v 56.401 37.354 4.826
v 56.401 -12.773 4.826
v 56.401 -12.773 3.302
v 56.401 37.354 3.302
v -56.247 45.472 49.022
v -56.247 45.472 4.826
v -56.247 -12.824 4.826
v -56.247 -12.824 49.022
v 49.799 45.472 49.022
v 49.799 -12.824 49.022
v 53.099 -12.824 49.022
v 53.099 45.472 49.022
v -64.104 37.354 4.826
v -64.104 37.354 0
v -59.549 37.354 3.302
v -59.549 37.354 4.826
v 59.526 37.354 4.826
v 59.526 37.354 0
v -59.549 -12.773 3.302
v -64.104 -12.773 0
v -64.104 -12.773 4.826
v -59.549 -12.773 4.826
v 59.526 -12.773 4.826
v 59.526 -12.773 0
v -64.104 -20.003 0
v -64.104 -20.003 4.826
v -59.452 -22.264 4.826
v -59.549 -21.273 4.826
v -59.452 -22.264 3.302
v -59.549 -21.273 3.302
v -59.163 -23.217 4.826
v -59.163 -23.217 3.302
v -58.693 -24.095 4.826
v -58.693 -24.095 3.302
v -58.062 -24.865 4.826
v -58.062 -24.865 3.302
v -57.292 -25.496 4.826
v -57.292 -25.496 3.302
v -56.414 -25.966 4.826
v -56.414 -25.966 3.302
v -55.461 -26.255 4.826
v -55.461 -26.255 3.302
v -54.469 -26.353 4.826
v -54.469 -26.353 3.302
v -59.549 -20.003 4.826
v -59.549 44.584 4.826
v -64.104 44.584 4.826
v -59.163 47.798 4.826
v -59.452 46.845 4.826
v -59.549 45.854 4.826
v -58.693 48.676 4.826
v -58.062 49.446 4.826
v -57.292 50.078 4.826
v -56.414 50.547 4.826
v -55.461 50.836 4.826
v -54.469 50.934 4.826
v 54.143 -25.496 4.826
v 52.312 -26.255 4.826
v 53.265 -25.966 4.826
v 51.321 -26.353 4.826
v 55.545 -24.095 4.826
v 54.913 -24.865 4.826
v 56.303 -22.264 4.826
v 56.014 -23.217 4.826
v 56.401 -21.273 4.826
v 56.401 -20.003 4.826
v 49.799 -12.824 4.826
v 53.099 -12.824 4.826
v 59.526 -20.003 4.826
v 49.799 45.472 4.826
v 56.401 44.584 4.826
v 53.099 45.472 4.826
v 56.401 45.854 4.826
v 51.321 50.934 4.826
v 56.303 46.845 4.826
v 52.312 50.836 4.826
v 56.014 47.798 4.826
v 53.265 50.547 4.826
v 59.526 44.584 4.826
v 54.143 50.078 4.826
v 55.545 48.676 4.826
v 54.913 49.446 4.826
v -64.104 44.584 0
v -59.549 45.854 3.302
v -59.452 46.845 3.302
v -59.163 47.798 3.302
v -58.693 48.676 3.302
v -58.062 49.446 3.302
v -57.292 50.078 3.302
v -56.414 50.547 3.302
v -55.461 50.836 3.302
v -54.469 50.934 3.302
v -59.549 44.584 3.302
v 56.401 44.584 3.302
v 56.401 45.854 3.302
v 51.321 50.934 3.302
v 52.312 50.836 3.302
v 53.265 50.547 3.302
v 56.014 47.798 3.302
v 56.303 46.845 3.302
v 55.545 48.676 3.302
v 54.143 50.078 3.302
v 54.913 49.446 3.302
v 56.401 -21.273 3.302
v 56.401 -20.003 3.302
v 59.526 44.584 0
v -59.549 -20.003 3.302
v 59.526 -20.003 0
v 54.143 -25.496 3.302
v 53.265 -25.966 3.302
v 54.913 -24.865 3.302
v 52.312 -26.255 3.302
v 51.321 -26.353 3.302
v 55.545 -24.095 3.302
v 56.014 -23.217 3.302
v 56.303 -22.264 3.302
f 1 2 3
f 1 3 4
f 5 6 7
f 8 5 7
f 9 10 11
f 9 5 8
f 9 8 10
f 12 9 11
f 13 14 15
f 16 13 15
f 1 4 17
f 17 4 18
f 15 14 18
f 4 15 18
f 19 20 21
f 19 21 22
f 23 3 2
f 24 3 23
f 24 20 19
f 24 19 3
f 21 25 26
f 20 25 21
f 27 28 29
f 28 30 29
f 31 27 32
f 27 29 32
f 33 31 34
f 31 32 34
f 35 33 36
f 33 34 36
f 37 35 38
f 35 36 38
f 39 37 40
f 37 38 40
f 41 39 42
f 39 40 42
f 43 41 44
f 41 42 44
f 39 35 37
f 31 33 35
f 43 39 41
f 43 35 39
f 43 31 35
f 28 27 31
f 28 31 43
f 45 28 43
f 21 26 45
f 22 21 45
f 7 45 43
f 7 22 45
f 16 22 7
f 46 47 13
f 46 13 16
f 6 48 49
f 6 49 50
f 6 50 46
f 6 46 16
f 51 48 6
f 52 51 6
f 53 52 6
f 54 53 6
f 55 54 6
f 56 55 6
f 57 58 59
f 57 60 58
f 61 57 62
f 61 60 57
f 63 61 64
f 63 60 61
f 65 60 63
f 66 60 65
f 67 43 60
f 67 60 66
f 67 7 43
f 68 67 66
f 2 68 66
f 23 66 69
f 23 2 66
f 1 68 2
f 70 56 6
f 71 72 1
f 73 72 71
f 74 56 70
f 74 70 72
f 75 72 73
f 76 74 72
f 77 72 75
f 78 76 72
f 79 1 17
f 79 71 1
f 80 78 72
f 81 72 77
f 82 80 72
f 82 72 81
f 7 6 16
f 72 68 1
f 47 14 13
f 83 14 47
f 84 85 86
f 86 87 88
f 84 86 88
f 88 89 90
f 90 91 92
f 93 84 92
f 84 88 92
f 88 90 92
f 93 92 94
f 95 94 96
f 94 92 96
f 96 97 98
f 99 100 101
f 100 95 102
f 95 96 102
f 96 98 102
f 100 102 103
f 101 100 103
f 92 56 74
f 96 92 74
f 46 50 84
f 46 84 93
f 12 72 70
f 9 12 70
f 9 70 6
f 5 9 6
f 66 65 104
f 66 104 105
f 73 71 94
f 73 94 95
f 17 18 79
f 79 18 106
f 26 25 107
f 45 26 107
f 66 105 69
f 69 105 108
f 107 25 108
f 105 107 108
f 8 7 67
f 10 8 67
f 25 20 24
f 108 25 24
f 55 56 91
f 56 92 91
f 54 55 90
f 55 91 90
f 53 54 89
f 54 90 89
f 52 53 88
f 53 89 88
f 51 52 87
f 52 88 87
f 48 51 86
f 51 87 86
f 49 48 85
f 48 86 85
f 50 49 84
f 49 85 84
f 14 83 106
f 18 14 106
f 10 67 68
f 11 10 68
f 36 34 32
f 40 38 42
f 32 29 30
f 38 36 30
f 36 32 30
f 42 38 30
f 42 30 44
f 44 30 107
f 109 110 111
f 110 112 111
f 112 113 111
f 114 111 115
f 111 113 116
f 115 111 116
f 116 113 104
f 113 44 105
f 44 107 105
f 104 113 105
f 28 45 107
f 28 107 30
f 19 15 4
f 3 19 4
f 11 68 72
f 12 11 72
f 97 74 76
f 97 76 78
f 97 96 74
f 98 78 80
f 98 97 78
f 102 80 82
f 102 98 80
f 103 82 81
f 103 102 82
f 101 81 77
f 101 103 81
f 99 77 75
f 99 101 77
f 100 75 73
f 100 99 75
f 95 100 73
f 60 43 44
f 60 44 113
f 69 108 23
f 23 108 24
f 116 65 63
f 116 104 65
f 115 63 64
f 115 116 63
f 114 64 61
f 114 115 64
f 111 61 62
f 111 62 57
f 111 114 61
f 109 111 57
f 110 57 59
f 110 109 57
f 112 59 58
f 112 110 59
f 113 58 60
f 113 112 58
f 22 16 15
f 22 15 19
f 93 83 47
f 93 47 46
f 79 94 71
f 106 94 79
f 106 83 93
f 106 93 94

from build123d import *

# Parameters (mm, degrees)
F0_W     = 123.629912734
F0_H     = 7.2298198938
F1_DEPTH = 4.826
F2_W     = 115.9501895308
F2_H     = 7.2298198938
F2_H_2   = 6.35
F2_H_3   = 63.7065680534
F3_DEPTH = 1.524
F5_R     = 5.08
F6_W     = 102.7462986398
F6_H     = 3.4007430077
F6_H_2   = 3.4007552
F7_DEPTH = 44.196
F8_DEPTH = 44.196


# Not quite as in the source:
# - ends of sketch curves that miss each other by under 0.0002 mm in the source are joined


with BuildPart() as f1:
    # F0 (on Top) → F1 (new body)
    with BuildSketch(Plane.XY):
        with Locations((-2.2894367576, -16.3875911385)):
            Rectangle(F0_W, F0_H)
    extrude(amount=F1_DEPTH)


with BuildPart() as f1b:
    # F0 (on Top) → F1, piece 2 (new body)
    with BuildSketch(Plane.XY):
        with Locations((-2.2894367576, 40.9689769149)):
            Rectangle(F0_W, F0_H)
    extrude(amount=F1_DEPTH)


with BuildPart() as f3:
    # F2 (on face) → F3 (new body)
    with BuildSketch(Plane.XY.offset(4.826)):
        with Locations((-1.5743747354, 40.9689769149)):
            Rectangle(F2_W, F2_H)
        with Locations((-1.5743747354, 47.7588868618)):
            Rectangle(F2_W, F2_H_2)
        with Locations((-1.5743747354, 5.5007829413)):
            Rectangle(F2_W, F2_H_3)
    extrude(amount=-F3_DEPTH)


with BuildPart() as f1b_1:
    add(f1b.part)

    # F4: union F3, F1
    add(f3.part)
    add(f1.part)

    # F5
    f5_edges = [f1b_1.edges().sort_by_distance(p)[0] for p in [
        (-59.54947, -26.352501, 4.064),
        (56.40072, -26.352501, 4.064),
        (56.40072, 50.933887, 4.064),
        (-59.54947, 50.933887, 4.064),
    ]]
    fillet(f5_edges, radius=F5_R)

    # F6 (on face) → F7 (join)
    with BuildSketch(Plane.XY.offset(4.826)):
        Polygon((-52.9475212097, 45.4720444977), (-56.2473237514, 45.4720444977), (-56.2473237514, -12.8244720399), (-52.9475212097, -12.8244720399), (-52.9475212097, -9.4237168399), (-52.9475212097, 42.0713014901), align=None)
        with Locations((-1.5743718898, 43.7716729939)):
            Rectangle(F6_W, F6_H)
        Polygon((53.0985676301, 45.4720334084), (49.7987774301, 45.4720334084), (49.7987774301, 42.0713014901), (49.7987774301, -9.4237168399), (49.7987774301, -12.8244717916), (53.0985676301, -12.8244717916), align=None)
        with Locations((-1.5743718898, -11.1240944399)):
            Rectangle(F6_W, F6_H_2)
    extrude(amount=F7_DEPTH)

    # F8 (add): a face of the model
    f8_faces = [f1b_1.faces().sort_by_distance(p)[0] for p in [
        (-1.5743718898, 16.3237923251, 4.826),
    ]]
    extrude(f8_faces, amount=F8_DEPTH)


solid = f1b_1.part
